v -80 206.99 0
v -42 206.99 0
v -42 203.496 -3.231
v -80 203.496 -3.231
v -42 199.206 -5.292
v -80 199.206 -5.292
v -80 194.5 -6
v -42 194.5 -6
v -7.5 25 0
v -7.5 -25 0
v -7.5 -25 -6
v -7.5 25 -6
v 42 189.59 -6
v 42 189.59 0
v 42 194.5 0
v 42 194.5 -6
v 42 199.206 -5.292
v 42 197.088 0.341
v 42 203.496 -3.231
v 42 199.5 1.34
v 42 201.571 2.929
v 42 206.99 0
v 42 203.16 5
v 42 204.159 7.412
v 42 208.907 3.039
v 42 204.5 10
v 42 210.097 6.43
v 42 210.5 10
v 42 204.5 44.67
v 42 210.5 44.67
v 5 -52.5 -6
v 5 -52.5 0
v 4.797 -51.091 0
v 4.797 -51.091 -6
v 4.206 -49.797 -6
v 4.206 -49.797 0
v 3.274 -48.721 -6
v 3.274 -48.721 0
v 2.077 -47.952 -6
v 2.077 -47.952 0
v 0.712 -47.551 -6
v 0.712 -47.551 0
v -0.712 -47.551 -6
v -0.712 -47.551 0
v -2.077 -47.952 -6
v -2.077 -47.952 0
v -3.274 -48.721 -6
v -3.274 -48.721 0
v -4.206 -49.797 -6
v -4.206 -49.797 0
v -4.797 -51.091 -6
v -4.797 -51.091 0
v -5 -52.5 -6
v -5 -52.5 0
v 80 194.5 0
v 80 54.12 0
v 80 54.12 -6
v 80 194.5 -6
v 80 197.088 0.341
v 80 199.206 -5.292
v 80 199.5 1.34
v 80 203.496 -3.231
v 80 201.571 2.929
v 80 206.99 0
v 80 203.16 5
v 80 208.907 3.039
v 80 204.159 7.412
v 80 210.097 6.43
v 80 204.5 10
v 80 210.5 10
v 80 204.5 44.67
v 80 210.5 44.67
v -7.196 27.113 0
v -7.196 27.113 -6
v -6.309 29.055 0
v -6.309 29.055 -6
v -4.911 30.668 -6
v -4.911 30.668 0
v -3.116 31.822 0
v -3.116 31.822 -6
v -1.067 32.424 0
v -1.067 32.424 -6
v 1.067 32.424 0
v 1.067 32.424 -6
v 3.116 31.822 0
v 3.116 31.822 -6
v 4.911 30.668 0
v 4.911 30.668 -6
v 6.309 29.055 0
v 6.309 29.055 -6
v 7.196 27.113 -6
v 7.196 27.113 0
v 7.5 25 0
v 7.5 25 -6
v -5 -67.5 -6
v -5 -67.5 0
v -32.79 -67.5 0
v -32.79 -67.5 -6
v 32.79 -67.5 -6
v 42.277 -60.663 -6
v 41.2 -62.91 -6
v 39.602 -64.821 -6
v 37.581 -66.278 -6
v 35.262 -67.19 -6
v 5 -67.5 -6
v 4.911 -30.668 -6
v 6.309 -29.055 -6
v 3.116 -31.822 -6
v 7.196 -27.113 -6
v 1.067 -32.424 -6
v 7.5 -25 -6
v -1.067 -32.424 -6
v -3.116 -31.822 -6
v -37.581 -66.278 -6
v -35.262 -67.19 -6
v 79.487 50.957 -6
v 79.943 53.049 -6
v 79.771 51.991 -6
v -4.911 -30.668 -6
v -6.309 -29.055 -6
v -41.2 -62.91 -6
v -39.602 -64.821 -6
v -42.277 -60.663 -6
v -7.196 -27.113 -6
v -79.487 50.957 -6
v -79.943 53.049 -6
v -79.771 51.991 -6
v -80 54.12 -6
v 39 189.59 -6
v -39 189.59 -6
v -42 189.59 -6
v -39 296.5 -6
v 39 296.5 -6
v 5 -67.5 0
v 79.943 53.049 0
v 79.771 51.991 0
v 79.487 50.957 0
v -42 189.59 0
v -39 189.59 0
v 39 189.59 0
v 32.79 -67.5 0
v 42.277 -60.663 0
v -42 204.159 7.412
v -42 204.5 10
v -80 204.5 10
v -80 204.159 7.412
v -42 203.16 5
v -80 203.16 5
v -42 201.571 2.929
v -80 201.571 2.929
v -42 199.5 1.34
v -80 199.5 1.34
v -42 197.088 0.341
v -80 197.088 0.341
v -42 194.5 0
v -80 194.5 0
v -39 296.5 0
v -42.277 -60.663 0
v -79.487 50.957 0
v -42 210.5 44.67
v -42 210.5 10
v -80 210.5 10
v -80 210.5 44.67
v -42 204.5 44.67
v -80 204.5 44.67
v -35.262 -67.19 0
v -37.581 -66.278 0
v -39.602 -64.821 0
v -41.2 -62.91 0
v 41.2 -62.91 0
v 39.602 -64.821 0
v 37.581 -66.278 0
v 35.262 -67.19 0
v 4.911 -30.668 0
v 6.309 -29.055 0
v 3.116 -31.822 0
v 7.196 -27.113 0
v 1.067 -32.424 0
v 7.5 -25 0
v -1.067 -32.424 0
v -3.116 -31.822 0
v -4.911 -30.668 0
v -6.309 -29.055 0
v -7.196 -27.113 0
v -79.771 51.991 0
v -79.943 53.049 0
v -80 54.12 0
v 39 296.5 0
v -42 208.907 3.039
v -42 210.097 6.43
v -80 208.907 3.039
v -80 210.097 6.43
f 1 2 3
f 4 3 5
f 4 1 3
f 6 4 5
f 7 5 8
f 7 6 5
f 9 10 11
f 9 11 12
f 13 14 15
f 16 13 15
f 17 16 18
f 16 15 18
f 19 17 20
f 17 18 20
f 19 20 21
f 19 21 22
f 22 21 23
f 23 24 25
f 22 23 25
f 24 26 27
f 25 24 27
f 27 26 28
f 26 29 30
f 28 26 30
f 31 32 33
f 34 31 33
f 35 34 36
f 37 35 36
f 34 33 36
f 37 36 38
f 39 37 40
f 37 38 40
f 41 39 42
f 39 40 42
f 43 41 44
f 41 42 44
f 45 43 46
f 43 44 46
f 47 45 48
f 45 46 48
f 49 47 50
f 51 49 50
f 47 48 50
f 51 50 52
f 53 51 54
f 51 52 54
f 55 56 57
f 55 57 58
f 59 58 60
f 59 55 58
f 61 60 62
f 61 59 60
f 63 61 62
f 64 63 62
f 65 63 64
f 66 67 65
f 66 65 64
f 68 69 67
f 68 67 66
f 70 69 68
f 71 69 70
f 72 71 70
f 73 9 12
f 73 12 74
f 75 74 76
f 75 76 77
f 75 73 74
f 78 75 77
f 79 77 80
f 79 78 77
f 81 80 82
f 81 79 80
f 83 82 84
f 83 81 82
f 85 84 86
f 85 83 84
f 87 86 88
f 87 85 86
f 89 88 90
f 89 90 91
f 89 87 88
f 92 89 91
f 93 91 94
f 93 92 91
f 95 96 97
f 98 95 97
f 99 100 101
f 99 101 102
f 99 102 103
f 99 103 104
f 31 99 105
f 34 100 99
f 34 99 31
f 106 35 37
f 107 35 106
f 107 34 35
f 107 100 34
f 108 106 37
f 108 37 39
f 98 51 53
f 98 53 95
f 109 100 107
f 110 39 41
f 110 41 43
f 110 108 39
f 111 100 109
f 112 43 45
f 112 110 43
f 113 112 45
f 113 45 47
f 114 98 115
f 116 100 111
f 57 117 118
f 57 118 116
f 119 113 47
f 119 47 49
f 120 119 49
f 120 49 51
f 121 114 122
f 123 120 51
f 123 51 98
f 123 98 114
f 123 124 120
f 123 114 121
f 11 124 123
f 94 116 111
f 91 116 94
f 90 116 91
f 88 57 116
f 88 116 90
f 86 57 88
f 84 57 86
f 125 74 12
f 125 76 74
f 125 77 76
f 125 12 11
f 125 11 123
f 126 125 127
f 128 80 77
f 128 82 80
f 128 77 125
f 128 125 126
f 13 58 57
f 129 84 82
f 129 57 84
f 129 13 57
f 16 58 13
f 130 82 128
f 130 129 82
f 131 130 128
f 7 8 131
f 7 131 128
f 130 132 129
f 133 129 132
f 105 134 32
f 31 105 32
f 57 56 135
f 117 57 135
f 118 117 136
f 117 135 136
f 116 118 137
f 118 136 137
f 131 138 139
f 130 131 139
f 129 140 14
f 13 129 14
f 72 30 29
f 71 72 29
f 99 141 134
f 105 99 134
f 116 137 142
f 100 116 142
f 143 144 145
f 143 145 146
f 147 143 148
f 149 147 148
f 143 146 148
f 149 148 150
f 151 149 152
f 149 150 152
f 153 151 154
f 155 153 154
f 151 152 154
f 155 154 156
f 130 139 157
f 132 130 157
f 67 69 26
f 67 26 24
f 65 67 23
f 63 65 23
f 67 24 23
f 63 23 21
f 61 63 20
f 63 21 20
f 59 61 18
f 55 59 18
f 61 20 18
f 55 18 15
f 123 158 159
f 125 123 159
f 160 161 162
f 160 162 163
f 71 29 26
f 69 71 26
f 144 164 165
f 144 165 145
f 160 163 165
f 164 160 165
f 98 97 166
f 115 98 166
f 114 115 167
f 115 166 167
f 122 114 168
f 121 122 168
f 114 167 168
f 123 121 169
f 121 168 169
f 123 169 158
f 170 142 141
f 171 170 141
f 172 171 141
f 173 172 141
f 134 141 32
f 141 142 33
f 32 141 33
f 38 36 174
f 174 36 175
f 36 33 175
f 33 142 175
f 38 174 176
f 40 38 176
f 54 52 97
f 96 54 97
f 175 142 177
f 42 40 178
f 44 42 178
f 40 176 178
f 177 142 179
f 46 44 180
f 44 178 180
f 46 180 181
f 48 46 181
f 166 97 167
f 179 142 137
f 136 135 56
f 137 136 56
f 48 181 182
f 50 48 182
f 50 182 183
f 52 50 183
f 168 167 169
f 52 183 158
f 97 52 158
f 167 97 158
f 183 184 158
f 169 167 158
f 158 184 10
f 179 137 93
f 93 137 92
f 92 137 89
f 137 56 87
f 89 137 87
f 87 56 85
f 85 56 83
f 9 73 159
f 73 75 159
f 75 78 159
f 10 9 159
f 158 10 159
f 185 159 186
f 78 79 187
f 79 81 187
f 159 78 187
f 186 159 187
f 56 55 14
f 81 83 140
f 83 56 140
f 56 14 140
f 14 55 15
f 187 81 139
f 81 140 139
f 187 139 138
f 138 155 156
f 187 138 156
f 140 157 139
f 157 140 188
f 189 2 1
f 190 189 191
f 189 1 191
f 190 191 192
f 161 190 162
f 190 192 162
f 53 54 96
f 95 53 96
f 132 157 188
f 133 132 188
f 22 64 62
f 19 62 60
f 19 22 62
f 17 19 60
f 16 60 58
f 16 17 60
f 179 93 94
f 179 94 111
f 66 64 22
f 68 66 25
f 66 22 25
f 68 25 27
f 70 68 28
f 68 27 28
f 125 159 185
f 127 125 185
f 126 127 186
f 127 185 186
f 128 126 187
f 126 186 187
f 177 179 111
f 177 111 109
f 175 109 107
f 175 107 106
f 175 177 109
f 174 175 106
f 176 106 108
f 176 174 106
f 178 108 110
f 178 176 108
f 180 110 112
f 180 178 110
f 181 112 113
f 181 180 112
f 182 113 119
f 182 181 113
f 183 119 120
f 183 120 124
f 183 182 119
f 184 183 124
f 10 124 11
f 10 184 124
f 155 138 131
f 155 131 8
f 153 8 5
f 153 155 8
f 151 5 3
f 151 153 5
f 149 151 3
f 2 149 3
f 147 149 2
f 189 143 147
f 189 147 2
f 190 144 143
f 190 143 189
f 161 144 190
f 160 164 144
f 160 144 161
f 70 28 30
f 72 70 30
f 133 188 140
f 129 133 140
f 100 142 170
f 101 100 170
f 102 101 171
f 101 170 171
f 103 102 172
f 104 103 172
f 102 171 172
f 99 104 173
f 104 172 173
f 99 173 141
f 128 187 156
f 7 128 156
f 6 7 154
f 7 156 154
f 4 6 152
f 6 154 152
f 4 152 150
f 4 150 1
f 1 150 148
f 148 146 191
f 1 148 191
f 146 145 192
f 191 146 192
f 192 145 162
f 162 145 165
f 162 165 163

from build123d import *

# Parameters (mm, degrees)
BASE_FLANGE1_DEPTH     = 6
SKETCHED_START         = -80
SKETCHED_BEND1_DEPTH   = 38
SKETCHED_START_2       = 42
SKETCHED_BEND1_2_DEPTH = 38
SKETCHED_BEND1_3_DEPTH = 38
SKETCHED_BEND1_4_DEPTH = 38


# Read off the part's stored shape, not the designer's step: Sketched Bend1
# Sheet-metal steps are written as plain solids
with BuildPart() as part:
    # Sketch1 → Base-Flange1 (new body)
    with BuildSketch(Plane.XY):
        with BuildLine():
            Line((80, 189.59), (80, 54.12))
            ThreePointArc((80, 54.12), (79.87085305, 52.518044922), (79.486747986, 50.957467367))
            Line((79.486747986, 50.957467367), (42.276747986, -60.662532633))
            ThreePointArc((42.276747986, -60.662532633), (38.636993829, -65.612500426), (32.79, -67.5))
            Line((32.79, -67.5), (5, -67.5))
            Line((5, -67.5), (5, -52.5))
            ThreePointArc((5, -52.5), (0, -47.5), (-5, -52.5))
            Line((-5, -52.5), (-5, -67.5))
            Line((-5, -67.5), (-32.79, -67.5))
            ThreePointArc((-32.79, -67.5), (-38.636993829, -65.612500426), (-42.276747986, -60.662532633))
            Line((-42.276747986, -60.662532633), (-79.486747986, 50.957467367))
            ThreePointArc((-79.486747986, 50.957467367), (-79.87085305, 52.518044922), (-80, 54.12))
            Line((-80, 54.12), (-80, 189.59))
            Line((-80, 189.59), (-80, 249.59))
            Line((-80, 249.59), (-42, 249.59))
            Line((-42, 249.59), (-42, 189.59))
            Line((-42, 189.59), (-39, 189.59))
            Line((-39, 189.59), (-39, 296.5))
            Line((-39, 296.5), (39, 296.5))
            Line((39, 296.5), (39, 189.59))
            Line((39, 189.59), (42, 189.59))
            Line((42, 189.59), (42, 249.59))
            Line((42, 249.59), (80, 249.59))
            Line((80, 249.59), (80, 189.59))
        make_face()
        with BuildLine():
            Line((7.5, 25), (7.5, -25))
            ThreePointArc((7.5, -25), (0, -32.5), (-7.5, -25))
            Line((-7.5, -25), (-7.5, 25))
            ThreePointArc((-7.5, 25), (0, 32.5), (7.5, 25))
        make_face(mode=Mode.SUBTRACT)
    extrude(amount=-BASE_FLANGE1_DEPTH)

    # Sketched Bend1 outline → Sketched Bend1 (cut)
    with BuildSketch(Plane.YZ.offset(SKETCHED_START)):
        with BuildLine():
            Line((249.59, 0), (206.989995997, 0))
            ThreePointArc((206.989995997, 0), (201.42820323, -4.422205102), (194.5, -6))
            Line((194.5, -6), (249.59, -6))
            Line((249.59, -6), (249.59, 0))
        make_face()
    extrude(amount=SKETCHED_BEND1_DEPTH, mode=Mode.SUBTRACT)

    # Sketched Bend1 2 outline → Sketched Bend1 2 (cut)
    with BuildSketch(Plane.YZ.offset(SKETCHED_START_2)):
        with BuildLine():
            Line((249.59, 0), (206.989995997, 0))
            ThreePointArc((206.989995997, 0), (201.42820323, -4.422205102), (194.5, -6))
            Line((194.5, -6), (249.59, -6))
            Line((249.59, -6), (249.59, 0))
        make_face()
    extrude(amount=SKETCHED_BEND1_2_DEPTH, mode=Mode.SUBTRACT)

    # Sketched Bend1 3 outline → Sketched Bend1 3 (add)
    with BuildSketch(Plane.YZ.offset(SKETCHED_START)):
        with BuildLine():
            Line((210.5, 10), (210.5, 44.669647752))
            Line((210.5, 44.669647752), (204.5, 44.669647752))
            Line((204.5, 44.669647752), (204.5, 10))
            ThreePointArc((204.5, 10), (201.571067812, 2.928932188), (194.5, 0))
            Line((194.5, 0), (206.989995997, 0))
            ThreePointArc((206.989995997, 0), (209.597018513, 4.700940458), (210.5, 10))
        make_face()
    extrude(amount=SKETCHED_BEND1_3_DEPTH)

    # Sketched Bend1 4 outline → Sketched Bend1 4 (add)
    with BuildSketch(Plane.YZ.offset(SKETCHED_START_2)):
        with BuildLine():
            Line((210.5, 10), (210.5, 44.669647752))
            Line((210.5, 44.669647752), (204.5, 44.669647752))
            Line((204.5, 44.669647752), (204.5, 10))
            ThreePointArc((204.5, 10), (201.571067812, 2.928932188), (194.5, 0))
            Line((194.5, 0), (206.989995997, 0))
            ThreePointArc((206.989995997, 0), (209.597018513, 4.700940458), (210.5, 10))
        make_face()
    extrude(amount=SKETCHED_BEND1_4_DEPTH)


solid = part.part
